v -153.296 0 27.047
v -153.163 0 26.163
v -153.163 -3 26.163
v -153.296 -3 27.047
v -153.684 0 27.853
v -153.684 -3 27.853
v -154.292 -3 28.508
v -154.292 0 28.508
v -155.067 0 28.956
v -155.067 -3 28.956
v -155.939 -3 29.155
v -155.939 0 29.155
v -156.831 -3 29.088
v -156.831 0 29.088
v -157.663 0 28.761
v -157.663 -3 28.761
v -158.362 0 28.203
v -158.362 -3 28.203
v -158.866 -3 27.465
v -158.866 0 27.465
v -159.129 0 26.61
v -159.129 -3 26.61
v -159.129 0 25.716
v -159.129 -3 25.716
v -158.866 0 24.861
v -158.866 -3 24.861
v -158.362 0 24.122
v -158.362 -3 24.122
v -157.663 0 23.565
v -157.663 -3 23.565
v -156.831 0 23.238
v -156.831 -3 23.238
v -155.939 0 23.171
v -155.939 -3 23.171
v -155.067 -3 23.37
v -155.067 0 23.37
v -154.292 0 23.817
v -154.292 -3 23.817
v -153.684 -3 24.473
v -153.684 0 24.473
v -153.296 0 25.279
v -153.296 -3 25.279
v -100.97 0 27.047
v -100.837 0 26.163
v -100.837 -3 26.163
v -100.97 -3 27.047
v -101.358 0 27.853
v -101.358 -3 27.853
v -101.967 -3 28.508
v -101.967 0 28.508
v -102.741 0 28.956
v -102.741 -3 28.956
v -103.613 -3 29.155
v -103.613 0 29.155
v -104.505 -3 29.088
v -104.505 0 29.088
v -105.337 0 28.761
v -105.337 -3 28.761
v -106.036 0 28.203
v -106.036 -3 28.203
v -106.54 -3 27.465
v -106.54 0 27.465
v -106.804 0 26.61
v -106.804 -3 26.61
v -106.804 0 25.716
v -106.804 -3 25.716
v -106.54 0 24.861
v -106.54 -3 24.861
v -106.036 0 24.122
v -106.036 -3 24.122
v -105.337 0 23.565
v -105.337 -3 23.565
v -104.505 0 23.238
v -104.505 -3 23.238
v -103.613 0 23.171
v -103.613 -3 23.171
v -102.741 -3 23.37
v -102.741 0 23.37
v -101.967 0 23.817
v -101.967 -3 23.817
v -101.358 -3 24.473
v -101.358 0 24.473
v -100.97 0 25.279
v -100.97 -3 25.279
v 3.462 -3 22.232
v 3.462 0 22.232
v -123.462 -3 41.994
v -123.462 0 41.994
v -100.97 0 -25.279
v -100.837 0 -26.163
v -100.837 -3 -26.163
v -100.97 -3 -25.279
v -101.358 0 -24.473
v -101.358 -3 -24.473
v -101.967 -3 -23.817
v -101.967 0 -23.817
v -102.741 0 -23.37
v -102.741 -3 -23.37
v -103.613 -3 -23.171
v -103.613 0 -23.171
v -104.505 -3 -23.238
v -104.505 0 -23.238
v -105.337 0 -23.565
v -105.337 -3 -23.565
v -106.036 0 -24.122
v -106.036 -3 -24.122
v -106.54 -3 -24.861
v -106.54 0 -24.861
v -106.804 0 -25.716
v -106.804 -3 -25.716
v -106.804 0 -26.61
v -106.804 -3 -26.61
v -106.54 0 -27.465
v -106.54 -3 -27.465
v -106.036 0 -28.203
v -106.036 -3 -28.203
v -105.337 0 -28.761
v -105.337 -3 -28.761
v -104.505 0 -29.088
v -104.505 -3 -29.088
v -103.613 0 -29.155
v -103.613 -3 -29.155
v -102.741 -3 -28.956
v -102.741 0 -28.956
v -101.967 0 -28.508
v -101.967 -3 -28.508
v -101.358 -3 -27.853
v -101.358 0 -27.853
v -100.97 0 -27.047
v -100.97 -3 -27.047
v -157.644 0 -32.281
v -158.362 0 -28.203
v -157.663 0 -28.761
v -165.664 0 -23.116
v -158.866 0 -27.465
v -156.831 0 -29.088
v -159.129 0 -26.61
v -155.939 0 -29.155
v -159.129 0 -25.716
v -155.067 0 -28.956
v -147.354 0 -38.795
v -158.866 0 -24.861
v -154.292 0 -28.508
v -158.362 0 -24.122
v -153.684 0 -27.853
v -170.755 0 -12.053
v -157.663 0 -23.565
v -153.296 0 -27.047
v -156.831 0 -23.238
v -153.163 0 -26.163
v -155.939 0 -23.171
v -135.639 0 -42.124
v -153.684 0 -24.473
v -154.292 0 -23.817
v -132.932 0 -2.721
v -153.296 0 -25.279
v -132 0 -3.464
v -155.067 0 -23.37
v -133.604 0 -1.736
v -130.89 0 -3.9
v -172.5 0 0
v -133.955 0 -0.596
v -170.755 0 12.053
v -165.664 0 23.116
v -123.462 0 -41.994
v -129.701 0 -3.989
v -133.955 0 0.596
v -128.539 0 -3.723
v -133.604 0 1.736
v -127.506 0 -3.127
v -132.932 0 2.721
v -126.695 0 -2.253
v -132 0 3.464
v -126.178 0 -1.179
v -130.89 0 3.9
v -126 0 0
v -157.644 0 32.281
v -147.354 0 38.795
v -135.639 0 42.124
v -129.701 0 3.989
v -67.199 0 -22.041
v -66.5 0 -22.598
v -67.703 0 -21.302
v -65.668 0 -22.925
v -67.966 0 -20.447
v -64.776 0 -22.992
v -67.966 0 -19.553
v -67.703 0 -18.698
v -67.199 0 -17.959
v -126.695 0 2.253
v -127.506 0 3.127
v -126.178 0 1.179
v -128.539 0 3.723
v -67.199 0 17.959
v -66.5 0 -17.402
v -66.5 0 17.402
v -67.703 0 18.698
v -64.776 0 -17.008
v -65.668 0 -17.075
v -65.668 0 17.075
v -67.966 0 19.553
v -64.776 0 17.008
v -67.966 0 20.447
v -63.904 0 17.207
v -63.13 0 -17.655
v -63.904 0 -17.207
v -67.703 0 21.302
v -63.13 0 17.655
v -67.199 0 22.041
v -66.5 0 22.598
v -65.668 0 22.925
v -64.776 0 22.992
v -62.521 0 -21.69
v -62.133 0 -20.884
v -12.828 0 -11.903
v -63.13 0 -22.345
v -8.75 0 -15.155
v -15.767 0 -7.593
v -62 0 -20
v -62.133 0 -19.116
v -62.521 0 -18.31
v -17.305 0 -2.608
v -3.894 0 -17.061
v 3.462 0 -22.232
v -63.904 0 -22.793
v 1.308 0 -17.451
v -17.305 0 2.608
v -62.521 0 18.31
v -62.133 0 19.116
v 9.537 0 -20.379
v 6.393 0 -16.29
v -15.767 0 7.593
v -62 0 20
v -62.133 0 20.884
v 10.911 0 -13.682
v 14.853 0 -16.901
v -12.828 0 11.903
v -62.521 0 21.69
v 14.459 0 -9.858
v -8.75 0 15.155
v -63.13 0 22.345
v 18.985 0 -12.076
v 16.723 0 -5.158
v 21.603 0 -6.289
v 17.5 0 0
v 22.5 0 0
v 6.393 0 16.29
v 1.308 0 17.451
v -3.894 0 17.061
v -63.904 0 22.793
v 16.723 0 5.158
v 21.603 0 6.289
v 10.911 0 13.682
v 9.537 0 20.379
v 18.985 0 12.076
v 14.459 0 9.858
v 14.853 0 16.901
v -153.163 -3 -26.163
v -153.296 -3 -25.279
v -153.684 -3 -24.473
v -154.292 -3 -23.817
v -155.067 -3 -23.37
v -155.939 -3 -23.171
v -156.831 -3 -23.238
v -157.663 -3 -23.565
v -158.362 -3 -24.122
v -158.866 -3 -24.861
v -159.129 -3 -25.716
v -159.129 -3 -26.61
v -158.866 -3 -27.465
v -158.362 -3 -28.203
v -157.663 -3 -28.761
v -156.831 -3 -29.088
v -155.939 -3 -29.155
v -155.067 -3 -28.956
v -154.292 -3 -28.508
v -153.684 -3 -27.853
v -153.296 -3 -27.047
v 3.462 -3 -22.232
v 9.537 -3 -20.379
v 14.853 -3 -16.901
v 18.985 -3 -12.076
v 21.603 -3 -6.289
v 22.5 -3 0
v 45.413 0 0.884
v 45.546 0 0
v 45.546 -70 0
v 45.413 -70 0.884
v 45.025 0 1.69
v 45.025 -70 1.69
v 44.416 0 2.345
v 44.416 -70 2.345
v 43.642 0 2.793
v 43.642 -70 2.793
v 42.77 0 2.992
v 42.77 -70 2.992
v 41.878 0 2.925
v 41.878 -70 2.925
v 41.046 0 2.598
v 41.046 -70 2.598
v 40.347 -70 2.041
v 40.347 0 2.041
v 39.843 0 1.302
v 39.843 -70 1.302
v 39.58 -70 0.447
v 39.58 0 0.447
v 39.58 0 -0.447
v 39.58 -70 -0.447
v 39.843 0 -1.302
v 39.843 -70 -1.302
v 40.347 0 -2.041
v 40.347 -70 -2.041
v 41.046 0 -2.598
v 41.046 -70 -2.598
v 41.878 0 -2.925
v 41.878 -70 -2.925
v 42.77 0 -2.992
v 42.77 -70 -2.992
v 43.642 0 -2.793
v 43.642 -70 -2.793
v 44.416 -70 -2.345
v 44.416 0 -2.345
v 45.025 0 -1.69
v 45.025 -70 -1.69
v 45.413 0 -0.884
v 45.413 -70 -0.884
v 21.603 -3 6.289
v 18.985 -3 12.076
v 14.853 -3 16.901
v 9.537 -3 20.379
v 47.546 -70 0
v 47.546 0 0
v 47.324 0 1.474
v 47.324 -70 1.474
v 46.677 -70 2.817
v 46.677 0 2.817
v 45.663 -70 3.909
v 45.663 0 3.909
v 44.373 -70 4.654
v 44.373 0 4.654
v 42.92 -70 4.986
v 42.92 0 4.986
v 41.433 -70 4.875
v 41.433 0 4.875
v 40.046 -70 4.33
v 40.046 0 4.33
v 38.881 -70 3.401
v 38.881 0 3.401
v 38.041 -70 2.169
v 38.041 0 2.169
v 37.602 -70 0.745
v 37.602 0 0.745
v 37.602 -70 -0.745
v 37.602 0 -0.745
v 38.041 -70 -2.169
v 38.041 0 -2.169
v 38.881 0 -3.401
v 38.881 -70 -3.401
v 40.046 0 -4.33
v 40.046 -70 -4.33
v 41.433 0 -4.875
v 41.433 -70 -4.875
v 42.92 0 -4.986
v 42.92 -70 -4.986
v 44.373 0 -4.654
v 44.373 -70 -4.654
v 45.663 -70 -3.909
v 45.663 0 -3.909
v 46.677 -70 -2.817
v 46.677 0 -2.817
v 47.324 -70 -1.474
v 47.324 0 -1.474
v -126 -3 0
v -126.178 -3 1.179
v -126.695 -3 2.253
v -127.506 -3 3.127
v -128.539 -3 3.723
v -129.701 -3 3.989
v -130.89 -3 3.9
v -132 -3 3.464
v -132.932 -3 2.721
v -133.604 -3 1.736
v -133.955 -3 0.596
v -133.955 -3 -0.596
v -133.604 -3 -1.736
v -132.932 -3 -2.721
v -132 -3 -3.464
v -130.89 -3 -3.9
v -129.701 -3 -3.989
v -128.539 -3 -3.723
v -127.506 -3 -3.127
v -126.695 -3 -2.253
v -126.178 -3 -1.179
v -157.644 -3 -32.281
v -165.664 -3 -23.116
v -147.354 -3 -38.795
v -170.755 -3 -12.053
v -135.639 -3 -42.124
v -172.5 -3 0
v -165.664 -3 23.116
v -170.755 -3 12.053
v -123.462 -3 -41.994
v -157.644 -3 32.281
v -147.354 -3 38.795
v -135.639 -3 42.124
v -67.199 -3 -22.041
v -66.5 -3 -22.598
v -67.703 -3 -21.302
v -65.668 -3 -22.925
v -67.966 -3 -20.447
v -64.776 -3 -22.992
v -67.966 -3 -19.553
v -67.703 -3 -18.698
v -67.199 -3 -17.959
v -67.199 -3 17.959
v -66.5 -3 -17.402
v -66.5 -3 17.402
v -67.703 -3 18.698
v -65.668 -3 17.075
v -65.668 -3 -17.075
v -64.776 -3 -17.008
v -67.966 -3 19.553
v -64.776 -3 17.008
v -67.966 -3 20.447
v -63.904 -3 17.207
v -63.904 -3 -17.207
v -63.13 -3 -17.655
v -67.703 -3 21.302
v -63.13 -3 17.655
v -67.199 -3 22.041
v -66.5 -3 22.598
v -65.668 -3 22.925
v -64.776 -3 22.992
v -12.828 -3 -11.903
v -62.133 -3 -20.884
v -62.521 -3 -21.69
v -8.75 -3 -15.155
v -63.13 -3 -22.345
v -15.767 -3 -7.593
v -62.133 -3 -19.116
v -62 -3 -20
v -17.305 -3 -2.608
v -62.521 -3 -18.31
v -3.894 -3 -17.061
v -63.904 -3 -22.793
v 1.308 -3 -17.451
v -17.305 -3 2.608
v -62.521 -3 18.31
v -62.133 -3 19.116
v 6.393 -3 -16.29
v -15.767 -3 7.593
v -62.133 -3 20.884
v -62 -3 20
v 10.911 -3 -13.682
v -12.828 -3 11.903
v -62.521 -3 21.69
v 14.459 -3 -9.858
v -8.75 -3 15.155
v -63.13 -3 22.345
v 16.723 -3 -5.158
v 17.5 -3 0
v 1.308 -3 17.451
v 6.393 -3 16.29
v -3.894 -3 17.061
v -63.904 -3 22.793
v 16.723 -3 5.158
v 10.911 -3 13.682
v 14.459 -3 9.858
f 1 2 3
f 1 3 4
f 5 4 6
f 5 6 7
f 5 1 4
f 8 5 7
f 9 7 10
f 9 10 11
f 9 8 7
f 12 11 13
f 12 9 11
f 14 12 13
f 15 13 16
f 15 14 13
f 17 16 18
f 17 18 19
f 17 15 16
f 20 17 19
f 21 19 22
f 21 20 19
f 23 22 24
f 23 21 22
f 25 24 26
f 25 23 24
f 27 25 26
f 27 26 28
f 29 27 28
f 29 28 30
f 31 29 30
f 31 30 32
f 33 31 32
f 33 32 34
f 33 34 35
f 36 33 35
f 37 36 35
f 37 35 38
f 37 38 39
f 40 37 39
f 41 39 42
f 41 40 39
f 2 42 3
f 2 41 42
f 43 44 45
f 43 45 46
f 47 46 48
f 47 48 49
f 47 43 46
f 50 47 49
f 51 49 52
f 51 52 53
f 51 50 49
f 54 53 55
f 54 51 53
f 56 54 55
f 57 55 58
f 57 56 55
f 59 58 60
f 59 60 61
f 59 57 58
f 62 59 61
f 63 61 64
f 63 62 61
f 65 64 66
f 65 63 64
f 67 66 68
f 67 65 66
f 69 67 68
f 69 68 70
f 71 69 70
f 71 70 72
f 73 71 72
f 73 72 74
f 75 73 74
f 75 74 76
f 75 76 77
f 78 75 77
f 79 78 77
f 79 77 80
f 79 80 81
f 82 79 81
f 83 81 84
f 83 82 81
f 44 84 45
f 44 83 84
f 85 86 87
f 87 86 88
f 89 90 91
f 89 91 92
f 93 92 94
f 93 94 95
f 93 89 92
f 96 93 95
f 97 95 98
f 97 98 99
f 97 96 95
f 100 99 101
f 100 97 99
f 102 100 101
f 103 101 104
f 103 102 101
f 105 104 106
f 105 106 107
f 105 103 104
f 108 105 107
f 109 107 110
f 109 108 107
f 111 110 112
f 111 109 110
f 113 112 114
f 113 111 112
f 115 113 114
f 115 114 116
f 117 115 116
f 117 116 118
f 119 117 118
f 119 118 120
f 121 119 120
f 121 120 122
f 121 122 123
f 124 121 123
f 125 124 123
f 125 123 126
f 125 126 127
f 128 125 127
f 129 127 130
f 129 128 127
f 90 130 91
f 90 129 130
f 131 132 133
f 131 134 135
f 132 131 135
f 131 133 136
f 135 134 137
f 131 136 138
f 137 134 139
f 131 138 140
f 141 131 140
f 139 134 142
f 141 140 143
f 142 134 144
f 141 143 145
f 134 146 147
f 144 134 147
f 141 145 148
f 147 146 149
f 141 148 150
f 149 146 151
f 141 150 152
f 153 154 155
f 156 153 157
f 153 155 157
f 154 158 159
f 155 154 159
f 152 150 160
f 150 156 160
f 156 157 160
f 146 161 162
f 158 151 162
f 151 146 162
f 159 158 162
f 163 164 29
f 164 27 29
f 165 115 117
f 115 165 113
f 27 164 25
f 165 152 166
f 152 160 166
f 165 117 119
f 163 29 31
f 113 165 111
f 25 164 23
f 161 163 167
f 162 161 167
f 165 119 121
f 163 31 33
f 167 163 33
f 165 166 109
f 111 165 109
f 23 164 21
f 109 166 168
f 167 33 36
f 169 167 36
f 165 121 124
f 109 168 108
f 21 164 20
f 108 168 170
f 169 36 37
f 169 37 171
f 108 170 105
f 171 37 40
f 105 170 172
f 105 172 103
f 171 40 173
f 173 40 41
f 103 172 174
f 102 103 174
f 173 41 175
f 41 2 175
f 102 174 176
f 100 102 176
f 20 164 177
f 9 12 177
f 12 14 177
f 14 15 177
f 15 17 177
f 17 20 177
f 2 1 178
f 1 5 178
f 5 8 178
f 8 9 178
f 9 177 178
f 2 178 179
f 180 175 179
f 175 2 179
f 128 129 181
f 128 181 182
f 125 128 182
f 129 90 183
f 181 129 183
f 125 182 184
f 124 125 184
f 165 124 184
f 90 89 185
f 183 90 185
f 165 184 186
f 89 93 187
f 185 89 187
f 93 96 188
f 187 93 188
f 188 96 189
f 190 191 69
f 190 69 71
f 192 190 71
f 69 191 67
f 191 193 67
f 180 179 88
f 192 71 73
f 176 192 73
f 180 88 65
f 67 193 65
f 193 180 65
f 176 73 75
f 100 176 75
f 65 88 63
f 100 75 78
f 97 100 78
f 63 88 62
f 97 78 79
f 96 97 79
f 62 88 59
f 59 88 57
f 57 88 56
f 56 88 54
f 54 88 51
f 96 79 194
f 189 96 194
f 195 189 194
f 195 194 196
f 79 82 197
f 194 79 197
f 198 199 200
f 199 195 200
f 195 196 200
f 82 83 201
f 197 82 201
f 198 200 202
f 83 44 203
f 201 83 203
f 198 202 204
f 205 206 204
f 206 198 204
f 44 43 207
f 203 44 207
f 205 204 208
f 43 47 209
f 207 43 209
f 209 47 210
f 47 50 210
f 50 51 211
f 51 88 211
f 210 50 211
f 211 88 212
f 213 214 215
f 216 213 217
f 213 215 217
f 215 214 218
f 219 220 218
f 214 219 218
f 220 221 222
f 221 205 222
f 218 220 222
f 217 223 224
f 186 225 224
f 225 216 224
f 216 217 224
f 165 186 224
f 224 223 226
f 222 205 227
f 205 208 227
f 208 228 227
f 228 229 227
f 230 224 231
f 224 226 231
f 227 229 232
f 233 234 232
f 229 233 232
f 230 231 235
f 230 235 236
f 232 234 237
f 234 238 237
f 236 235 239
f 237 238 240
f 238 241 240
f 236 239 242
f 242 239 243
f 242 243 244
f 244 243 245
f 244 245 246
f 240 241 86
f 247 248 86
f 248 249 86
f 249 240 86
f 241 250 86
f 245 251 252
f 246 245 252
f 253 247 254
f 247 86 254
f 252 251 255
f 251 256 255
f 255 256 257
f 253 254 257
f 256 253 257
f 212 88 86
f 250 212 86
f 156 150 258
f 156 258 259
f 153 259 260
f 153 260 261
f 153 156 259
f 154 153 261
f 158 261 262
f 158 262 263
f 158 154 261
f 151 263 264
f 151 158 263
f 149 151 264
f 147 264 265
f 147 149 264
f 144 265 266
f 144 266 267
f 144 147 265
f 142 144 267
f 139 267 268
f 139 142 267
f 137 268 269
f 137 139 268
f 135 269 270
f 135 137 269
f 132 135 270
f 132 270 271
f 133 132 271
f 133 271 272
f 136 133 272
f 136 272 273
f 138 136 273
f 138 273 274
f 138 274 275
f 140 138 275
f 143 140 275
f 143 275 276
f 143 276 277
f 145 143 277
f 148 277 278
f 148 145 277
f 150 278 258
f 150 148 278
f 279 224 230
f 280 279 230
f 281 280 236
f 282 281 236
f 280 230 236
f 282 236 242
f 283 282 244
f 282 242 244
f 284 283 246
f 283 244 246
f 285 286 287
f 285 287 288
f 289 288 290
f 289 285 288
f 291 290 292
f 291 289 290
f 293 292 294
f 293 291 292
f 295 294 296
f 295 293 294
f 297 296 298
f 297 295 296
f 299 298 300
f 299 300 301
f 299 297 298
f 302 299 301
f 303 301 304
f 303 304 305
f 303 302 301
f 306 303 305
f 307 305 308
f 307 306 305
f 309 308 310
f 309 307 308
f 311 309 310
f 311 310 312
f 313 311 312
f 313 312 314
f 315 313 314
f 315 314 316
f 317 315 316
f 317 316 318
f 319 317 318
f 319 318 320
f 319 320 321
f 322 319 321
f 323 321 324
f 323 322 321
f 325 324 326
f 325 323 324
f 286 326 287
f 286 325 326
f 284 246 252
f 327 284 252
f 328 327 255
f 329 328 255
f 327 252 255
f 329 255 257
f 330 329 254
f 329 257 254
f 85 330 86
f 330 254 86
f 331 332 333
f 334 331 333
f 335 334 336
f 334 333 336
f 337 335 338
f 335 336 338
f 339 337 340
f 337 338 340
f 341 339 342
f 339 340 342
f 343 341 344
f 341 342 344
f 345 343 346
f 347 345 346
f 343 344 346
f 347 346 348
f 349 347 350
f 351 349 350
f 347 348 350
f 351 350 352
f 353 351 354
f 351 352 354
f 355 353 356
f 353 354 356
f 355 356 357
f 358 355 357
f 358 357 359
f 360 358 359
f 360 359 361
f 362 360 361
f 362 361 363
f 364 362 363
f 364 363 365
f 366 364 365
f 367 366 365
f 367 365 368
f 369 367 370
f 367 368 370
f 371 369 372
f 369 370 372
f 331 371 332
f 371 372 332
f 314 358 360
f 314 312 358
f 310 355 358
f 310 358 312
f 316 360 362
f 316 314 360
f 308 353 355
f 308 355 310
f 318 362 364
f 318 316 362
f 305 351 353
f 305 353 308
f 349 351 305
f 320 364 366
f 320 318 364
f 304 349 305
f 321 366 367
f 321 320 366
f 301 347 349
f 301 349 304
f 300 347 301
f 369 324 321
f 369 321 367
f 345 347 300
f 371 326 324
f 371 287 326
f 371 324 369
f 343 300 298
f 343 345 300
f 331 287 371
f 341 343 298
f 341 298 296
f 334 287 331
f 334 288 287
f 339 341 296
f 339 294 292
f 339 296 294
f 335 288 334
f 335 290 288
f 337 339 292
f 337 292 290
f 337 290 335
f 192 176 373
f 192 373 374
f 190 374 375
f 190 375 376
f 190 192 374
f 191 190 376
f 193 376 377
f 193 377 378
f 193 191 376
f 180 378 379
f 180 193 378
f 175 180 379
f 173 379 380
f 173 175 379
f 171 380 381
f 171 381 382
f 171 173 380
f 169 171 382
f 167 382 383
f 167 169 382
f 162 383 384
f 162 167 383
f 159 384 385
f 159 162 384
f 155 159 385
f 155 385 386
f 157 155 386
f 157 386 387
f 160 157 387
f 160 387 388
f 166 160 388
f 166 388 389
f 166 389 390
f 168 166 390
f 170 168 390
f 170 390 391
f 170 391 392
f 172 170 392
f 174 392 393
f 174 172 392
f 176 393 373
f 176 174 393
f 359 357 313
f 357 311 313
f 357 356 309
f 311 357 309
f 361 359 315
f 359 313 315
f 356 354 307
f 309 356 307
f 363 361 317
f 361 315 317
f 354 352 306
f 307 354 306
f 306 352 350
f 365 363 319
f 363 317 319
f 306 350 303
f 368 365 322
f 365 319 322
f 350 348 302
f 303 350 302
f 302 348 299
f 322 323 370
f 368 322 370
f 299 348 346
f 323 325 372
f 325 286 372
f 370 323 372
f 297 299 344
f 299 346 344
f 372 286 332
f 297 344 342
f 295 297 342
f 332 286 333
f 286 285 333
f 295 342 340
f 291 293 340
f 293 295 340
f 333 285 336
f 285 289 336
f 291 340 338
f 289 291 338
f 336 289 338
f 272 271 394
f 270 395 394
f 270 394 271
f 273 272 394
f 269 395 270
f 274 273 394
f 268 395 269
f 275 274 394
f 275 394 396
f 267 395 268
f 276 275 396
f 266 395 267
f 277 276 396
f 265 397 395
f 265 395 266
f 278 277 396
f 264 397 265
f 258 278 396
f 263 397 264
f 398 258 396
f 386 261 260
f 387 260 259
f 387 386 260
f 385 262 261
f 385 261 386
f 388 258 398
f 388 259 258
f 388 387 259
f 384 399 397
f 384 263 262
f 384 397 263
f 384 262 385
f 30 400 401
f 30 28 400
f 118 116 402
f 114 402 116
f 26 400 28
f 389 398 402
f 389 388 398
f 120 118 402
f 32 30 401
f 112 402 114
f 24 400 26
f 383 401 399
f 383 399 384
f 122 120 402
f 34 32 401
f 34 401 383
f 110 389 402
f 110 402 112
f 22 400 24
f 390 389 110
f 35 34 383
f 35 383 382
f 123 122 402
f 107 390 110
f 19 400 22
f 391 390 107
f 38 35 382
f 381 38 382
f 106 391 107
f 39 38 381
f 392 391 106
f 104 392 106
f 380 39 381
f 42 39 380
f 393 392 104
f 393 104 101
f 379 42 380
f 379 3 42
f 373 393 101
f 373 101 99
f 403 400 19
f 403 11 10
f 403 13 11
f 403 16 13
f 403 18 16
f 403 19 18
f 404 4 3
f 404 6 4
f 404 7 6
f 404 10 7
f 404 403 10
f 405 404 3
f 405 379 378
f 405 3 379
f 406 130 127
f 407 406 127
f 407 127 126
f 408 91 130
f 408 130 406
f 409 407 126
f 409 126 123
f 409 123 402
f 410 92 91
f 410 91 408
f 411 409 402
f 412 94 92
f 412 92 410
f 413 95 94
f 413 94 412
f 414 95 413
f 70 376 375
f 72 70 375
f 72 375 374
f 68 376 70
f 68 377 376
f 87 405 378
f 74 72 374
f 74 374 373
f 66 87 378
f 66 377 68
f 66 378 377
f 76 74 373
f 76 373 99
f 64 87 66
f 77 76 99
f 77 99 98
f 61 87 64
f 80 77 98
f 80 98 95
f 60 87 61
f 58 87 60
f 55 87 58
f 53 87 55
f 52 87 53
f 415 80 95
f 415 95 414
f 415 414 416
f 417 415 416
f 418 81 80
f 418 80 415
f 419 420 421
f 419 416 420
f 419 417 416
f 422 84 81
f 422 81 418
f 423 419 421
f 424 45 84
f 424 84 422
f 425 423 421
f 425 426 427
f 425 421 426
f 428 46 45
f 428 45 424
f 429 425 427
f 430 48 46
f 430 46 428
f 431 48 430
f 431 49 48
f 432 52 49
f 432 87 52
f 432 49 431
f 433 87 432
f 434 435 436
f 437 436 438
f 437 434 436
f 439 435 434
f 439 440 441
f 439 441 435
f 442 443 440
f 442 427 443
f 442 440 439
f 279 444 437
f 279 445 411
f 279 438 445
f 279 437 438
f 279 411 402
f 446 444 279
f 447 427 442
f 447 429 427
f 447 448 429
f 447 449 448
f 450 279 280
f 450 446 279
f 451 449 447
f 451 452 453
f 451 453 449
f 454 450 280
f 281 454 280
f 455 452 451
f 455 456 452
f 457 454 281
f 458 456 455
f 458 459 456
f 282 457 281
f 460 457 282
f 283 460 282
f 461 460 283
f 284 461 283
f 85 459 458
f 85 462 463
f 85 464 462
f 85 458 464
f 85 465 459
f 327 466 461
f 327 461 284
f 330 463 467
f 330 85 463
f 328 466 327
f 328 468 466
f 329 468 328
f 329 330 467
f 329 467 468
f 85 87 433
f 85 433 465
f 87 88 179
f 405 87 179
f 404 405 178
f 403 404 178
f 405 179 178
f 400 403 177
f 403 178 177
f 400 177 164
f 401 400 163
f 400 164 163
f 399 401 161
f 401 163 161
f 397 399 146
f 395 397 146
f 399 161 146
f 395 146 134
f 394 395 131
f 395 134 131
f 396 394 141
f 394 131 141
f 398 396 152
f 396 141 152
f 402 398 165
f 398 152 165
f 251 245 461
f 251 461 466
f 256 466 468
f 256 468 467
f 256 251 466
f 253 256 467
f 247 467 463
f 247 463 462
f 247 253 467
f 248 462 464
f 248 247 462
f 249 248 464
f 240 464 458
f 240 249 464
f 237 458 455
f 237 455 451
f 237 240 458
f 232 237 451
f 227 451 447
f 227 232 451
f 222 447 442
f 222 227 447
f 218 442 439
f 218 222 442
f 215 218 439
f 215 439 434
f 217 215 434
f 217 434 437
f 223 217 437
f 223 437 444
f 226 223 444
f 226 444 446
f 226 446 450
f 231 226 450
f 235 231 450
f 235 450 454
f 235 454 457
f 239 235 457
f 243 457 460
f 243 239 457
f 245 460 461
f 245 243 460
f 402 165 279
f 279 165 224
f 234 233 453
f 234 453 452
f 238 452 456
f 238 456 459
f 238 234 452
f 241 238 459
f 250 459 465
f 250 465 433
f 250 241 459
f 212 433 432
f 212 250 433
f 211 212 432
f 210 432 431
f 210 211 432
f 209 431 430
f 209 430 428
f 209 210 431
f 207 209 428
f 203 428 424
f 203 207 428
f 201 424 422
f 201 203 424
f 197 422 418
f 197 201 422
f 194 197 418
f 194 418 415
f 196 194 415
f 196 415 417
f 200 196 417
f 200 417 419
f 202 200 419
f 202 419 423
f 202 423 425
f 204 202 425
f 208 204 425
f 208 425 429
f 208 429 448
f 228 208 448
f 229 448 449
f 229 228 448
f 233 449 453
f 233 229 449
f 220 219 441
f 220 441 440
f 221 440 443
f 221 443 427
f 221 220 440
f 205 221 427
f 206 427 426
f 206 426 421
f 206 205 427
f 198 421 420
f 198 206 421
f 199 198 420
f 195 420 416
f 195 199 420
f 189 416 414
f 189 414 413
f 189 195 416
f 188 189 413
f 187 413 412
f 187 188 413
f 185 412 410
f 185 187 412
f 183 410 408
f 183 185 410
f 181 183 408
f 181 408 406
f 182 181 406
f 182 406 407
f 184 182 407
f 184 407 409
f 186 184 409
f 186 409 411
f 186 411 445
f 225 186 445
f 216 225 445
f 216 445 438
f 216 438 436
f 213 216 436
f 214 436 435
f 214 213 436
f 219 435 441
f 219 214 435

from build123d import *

# Parameters (mm, degrees)
F0_R     = 17.5
F0_R_2   = 3
F0_R_3   = 4
F1_DEPTH = 3
F2_R     = 5
F2_R_2   = 3
F3_DEPTH = 70


with BuildPart() as f1:
    # F0 (on Front) → F1 (new body)
    with BuildSketch(Plane.XZ):
        with BuildLine():
            ThreePointArc((3.461538, -22.232133), (17.089977, -14.634982), (22.5, 0))
            ThreePointArc((22.5, 0), (17.089977, 14.634982), (3.461538, 22.232133))
            ThreePointArc((3.461538, 22.232133), (-22.5, 0), (3.461538, -22.232133))
        make_face()
        Circle(F0_R, mode=Mode.SUBTRACT)
        with BuildLine():
            ThreePointArc((3.461538, -22.232133), (-22.5, 0), (3.461538, 22.232133))
            Line((3.461538, 22.232133), (-123.461538, 41.99403))
            ThreePointArc((-123.461538, 41.99403), (-97.718933, 27.643855), (-87.5, 0))
            ThreePointArc((-87.5, 0), (-97.718933, -27.643855), (-123.461538, -41.99403))
            Line((-123.461538, -41.99403), (3.461538, -22.232133))
        make_face()
        with Locations((-65, -20)):
            Circle(F0_R_2, mode=Mode.SUBTRACT)
        with Locations((-65, 20)):
            Circle(F0_R_2, mode=Mode.SUBTRACT)
        with BuildLine():
            ThreePointArc((-87.5, 0), (-97.718933, 27.643855), (-123.461538, 41.99403))
            ThreePointArc((-123.461538, 41.99403), (-172.5, 0), (-123.461538, -41.99403))
            ThreePointArc((-123.461538, -41.99403), (-97.718933, -27.643855), (-87.5, 0))
        make_face()
        with Locations((-156.162951, -26.162951)):
            Circle(F0_R_2, mode=Mode.SUBTRACT)
        with Locations((-103.837049, -26.162951)):
            Circle(F0_R_2, mode=Mode.SUBTRACT)
        with Locations((-130, 0)):
            Circle(F0_R_3, mode=Mode.SUBTRACT)
        with Locations((-156.162951, 26.162951)):
            Circle(F0_R_2, mode=Mode.SUBTRACT)
        with Locations((-103.837049, 26.162951)):
            Circle(F0_R_2, mode=Mode.SUBTRACT)
    extrude(amount=F1_DEPTH)


with BuildPart() as f3:
    # F2 (on Front) → F3 (new body)
    with BuildSketch(Plane.XZ):
        with Locations((42.546024, 0)):
            Circle(F2_R)
        with Locations((42.546024, 0)):
            Circle(F2_R_2, mode=Mode.SUBTRACT)
    extrude(amount=F3_DEPTH)


solid = Compound([f1.part, f3.part])
